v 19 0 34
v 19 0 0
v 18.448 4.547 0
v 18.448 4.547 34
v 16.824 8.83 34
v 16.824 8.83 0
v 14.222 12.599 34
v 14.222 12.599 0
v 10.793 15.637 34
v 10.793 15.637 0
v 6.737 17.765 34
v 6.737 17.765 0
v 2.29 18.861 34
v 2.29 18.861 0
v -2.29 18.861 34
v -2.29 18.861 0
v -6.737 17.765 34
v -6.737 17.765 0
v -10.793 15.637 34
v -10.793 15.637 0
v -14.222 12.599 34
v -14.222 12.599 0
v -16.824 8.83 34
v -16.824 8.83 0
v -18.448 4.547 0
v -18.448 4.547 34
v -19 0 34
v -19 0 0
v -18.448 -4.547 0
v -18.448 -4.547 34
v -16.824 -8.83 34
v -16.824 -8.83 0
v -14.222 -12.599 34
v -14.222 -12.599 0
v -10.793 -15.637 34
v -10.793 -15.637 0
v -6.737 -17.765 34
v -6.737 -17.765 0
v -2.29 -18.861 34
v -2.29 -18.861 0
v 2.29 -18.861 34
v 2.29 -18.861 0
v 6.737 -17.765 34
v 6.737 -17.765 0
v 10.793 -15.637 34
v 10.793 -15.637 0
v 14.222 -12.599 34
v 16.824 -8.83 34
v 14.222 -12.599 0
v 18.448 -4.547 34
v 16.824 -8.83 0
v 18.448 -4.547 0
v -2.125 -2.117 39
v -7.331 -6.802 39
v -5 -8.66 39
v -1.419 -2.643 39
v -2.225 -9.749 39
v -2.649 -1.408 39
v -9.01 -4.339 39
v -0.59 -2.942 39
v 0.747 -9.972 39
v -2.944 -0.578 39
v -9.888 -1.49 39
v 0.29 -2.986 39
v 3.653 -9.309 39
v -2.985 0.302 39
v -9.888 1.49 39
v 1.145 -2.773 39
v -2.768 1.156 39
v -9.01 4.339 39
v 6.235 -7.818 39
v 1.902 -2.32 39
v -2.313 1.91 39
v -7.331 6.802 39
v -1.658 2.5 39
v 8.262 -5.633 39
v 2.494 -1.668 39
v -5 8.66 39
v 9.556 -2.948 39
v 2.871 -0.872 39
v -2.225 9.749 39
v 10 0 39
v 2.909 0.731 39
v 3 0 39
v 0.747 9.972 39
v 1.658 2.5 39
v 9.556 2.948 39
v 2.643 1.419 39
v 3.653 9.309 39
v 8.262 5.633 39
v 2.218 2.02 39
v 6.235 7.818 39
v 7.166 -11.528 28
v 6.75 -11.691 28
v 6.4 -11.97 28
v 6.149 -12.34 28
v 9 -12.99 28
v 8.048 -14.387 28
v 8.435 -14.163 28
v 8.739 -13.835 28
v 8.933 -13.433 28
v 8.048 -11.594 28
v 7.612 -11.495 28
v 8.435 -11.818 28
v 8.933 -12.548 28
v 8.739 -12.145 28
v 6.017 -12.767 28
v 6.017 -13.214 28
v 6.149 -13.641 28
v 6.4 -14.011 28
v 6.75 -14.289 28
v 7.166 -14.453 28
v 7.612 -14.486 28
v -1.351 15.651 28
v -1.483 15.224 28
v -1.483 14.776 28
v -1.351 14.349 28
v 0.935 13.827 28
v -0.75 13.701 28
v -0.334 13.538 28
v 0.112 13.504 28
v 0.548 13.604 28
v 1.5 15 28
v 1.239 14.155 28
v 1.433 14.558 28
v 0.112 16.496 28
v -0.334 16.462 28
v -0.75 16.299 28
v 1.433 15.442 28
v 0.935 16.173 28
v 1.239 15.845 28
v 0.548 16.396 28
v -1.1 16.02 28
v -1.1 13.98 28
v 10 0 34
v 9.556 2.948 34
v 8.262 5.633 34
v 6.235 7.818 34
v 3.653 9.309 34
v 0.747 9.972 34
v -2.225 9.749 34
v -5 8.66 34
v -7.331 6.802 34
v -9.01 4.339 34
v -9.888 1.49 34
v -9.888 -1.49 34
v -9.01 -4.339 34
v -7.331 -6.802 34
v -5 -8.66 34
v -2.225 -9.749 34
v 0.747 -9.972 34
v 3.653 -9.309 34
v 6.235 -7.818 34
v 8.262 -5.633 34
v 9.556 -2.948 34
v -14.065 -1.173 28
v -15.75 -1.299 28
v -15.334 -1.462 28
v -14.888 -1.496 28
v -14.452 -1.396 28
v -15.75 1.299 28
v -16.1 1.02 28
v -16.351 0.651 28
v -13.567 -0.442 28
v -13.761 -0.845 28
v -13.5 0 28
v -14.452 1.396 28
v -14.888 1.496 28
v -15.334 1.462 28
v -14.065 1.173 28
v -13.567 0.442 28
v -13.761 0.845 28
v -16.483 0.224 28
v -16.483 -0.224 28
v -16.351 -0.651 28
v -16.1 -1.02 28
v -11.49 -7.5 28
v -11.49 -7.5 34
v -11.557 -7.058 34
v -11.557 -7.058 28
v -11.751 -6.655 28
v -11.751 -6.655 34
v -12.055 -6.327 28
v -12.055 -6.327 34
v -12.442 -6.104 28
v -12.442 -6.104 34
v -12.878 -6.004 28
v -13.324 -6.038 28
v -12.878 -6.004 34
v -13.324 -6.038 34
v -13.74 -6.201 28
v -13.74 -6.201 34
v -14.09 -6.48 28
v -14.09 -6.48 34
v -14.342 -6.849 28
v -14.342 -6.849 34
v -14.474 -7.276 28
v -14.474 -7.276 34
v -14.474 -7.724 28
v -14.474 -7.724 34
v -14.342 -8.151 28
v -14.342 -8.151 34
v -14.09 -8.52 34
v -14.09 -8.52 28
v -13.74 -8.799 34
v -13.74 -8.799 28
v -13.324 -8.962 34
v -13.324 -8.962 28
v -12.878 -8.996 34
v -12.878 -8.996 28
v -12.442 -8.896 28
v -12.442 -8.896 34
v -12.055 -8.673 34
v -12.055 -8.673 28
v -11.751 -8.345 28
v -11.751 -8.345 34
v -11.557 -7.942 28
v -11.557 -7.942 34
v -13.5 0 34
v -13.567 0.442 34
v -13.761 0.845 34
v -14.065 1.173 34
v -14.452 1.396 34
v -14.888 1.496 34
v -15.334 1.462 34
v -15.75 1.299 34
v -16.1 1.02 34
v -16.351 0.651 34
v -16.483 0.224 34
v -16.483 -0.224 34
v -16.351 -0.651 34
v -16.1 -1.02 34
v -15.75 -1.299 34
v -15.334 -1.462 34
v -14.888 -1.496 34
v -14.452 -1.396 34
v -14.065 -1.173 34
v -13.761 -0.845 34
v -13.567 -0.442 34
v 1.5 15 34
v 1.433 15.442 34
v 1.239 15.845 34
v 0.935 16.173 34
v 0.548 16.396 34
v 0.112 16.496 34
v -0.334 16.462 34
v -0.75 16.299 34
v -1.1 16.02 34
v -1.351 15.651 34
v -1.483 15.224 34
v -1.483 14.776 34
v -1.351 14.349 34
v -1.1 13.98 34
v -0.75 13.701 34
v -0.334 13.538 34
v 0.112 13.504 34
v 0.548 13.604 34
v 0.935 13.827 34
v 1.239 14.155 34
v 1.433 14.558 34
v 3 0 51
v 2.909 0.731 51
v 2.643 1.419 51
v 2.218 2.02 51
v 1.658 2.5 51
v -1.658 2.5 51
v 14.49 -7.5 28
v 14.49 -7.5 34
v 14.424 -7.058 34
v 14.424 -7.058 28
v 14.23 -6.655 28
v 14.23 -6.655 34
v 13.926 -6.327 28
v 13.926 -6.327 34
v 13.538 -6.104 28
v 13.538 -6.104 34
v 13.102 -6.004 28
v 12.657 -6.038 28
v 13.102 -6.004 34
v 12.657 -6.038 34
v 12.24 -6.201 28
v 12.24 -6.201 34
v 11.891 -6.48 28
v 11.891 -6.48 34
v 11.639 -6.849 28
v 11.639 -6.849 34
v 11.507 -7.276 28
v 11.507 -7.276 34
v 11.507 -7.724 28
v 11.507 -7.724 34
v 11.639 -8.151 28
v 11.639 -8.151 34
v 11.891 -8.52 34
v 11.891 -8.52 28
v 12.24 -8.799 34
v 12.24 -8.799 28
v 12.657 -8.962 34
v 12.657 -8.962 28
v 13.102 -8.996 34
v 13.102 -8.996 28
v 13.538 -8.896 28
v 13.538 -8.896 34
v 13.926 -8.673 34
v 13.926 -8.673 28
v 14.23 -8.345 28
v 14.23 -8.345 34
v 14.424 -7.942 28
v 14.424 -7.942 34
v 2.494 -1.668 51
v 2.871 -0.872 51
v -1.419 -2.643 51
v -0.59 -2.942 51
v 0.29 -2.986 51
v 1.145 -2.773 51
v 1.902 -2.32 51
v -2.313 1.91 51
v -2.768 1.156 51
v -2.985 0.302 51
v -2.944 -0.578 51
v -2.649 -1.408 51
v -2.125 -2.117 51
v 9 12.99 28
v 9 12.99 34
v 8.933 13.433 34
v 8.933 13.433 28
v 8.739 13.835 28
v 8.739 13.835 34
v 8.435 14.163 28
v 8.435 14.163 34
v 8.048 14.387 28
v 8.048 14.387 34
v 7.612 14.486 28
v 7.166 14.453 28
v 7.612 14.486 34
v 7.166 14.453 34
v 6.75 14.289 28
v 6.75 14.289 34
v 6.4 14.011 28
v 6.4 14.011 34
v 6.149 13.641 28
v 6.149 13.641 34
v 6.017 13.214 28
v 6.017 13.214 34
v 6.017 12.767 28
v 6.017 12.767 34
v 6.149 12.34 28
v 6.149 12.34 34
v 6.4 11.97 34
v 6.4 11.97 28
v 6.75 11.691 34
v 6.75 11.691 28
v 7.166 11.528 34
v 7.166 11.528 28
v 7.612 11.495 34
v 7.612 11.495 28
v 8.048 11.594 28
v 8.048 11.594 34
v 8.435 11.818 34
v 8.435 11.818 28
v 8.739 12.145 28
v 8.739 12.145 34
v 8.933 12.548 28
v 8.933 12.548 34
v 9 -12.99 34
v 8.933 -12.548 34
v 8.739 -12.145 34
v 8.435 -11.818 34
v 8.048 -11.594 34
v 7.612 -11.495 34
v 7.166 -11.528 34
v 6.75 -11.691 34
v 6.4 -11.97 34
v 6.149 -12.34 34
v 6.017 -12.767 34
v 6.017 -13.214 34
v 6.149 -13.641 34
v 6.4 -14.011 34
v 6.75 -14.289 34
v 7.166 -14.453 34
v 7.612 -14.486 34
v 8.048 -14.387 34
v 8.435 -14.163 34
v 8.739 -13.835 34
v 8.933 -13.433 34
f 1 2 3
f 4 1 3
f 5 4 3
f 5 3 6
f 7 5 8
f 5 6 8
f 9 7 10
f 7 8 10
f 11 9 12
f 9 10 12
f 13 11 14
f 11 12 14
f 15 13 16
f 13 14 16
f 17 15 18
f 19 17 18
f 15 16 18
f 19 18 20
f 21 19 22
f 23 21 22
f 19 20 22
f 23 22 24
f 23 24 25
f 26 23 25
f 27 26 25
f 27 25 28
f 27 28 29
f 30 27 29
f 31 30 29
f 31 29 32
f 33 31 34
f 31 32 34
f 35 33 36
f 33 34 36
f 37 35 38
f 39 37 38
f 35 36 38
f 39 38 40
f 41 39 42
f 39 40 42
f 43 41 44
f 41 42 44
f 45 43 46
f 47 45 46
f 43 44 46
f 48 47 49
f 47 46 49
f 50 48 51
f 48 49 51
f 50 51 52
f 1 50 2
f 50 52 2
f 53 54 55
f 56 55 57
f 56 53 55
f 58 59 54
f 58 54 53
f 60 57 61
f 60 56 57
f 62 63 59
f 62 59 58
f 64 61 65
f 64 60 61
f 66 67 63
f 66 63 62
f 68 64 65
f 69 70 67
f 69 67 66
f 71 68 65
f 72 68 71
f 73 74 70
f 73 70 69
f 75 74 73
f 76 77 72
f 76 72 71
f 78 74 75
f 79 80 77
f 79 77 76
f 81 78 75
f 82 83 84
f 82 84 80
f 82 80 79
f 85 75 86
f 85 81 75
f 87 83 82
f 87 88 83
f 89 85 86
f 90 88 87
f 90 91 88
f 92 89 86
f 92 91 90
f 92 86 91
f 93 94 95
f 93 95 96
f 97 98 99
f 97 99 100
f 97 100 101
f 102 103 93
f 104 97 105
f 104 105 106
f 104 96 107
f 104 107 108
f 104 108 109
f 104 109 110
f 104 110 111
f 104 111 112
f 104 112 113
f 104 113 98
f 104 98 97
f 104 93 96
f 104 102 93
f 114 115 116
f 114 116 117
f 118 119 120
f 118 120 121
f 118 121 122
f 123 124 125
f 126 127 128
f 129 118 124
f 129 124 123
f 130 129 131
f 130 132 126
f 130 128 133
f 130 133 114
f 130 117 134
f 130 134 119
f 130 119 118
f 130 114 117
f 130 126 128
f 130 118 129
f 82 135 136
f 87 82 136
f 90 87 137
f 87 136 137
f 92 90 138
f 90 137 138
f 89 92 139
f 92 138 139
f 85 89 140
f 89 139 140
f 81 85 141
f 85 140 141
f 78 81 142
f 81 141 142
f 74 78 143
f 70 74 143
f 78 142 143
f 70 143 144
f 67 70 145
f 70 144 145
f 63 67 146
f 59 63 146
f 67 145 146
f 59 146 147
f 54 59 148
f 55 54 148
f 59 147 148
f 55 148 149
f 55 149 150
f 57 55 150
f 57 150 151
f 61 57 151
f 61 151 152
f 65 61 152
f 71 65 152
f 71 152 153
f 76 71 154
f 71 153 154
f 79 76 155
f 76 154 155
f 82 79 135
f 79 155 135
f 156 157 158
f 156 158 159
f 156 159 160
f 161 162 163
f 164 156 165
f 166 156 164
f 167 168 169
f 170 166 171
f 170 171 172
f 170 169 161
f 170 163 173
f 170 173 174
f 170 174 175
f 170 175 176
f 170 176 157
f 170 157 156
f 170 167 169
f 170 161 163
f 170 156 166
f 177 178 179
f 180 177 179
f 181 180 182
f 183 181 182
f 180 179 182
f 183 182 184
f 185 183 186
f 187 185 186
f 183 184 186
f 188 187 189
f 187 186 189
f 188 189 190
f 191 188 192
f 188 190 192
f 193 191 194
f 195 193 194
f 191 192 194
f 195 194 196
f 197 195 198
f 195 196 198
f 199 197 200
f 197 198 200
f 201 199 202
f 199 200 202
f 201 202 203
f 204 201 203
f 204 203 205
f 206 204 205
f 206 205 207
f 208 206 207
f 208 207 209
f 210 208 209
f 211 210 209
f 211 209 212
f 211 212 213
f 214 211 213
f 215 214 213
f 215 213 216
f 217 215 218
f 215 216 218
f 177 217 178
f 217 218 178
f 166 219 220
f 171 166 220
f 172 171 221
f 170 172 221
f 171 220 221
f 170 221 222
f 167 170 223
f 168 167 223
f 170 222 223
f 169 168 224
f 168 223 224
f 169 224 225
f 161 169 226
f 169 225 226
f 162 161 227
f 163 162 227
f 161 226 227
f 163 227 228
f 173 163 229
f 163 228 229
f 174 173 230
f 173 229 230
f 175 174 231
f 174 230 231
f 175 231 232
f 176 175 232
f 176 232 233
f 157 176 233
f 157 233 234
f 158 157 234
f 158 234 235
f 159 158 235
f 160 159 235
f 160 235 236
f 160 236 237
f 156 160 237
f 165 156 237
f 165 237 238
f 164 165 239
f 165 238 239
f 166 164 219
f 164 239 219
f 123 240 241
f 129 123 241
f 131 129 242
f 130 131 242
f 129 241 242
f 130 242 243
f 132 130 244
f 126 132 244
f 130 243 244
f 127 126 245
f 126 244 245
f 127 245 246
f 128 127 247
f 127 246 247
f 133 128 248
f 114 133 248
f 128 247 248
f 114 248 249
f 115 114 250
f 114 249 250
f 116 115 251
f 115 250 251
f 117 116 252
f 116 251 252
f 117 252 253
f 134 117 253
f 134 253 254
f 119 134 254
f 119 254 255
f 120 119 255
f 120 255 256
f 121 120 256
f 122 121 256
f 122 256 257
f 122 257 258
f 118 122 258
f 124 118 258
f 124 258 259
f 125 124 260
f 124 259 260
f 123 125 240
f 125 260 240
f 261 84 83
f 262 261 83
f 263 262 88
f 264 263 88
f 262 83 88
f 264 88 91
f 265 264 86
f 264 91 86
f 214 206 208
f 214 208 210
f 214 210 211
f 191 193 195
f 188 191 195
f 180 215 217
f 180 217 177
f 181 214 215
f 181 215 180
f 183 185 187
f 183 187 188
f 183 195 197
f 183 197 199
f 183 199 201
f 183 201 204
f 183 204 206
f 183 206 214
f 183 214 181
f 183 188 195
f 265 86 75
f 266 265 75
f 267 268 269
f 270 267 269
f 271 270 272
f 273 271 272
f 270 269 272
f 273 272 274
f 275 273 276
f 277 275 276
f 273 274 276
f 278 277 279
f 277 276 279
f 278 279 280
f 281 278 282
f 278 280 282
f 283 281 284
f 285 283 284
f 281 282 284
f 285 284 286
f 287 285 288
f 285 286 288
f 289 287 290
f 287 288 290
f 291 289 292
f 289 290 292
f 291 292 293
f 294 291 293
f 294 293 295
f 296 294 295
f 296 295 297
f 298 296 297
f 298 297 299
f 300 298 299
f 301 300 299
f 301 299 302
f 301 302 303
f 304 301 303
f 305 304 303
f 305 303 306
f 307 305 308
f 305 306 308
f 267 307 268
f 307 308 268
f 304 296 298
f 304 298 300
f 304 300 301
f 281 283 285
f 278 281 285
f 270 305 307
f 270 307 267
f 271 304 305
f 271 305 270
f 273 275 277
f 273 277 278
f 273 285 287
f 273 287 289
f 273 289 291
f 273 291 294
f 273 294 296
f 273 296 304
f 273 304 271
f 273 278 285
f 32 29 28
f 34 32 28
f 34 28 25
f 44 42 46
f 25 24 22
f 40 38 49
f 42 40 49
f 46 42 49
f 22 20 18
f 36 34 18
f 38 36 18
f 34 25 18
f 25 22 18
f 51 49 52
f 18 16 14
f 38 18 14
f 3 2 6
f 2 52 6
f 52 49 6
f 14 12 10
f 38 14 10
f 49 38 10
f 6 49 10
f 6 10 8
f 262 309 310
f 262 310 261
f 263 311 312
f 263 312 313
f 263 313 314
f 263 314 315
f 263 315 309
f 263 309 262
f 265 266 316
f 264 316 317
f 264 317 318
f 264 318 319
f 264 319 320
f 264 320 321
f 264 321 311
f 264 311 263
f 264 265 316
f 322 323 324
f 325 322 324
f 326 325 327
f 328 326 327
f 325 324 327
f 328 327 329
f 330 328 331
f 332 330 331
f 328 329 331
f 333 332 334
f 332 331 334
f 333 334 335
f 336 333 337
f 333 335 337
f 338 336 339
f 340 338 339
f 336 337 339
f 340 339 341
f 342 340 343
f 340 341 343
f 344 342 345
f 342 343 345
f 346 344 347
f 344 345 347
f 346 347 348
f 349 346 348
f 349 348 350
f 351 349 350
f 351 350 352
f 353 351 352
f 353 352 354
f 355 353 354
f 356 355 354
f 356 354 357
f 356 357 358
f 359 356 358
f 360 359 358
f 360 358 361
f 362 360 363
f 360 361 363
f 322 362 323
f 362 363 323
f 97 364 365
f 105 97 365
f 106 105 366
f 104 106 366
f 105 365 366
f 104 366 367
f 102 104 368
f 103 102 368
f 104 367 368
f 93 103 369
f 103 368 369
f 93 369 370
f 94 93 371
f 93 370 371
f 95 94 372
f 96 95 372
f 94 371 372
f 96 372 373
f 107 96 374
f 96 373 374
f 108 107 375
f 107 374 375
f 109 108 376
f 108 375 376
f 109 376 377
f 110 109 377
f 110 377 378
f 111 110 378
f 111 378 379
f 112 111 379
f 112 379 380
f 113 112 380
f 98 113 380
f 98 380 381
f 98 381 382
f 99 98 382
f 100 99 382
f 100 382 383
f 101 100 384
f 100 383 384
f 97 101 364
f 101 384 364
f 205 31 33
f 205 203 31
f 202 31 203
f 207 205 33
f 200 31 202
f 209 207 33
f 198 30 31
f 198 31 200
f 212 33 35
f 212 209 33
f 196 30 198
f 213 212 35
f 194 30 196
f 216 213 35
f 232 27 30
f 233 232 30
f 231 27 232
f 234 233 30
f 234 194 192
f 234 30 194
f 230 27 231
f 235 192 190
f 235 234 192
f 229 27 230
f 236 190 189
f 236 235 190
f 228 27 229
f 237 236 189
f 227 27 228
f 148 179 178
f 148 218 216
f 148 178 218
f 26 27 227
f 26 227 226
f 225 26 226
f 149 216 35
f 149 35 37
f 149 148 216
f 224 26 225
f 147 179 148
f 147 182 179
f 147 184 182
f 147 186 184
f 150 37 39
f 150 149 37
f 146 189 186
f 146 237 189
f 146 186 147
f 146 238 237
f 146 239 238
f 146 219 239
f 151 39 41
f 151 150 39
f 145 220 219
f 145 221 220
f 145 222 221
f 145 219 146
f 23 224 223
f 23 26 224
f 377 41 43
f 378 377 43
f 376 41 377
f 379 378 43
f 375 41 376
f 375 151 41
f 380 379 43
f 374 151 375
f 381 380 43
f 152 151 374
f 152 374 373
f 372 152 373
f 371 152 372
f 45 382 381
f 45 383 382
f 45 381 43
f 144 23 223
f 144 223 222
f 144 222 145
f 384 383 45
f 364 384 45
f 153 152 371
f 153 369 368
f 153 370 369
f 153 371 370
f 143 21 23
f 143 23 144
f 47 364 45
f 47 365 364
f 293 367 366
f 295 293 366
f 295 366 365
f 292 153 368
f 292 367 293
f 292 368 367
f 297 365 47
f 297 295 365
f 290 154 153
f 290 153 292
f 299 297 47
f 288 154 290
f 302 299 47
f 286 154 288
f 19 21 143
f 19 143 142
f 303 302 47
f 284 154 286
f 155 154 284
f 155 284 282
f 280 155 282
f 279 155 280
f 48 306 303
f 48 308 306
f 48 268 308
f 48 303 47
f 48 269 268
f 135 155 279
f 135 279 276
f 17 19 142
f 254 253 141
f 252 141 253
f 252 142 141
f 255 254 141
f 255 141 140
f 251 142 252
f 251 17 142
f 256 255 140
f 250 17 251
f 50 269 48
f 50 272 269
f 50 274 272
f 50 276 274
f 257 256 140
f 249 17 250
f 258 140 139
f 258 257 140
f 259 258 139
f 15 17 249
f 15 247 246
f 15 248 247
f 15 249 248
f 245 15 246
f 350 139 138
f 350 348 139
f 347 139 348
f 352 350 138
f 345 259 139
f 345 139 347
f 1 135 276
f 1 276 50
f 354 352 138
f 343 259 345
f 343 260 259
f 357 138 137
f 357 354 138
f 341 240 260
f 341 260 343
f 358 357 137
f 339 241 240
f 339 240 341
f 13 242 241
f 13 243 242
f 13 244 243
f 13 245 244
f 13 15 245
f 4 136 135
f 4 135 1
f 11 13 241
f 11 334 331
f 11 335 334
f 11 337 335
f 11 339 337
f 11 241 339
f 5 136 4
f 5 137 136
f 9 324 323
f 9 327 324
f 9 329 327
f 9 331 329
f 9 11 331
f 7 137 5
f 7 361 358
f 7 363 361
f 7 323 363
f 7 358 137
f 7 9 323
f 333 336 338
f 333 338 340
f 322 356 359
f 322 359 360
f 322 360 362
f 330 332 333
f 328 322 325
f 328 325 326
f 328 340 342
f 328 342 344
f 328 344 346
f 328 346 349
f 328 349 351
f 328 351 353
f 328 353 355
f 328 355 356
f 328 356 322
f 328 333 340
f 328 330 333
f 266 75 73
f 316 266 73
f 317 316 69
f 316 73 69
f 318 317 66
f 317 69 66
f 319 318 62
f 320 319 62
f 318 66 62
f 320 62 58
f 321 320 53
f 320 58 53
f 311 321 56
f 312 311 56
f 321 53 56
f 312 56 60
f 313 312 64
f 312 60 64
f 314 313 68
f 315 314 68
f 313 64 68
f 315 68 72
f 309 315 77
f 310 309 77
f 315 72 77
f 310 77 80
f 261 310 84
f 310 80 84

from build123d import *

# Parameters (mm, degrees)
SKETCH1_R           = 19
BOSS_EXTRUDE1_DEPTH = 34
SKETCH2_R           = 1.5
CUT_EXTRUDE1_DEPTH  = 6
SKETCH3_R           = 10
BOSS_EXTRUDE2_DEPTH = 5
BOSS_EXTRUDE3_DEPTH = 12


with BuildPart() as part:
    # Sketch1 → Boss-Extrude1 (new body)
    with BuildSketch(Plane.XY):
        Circle(SKETCH1_R)
    extrude(amount=BOSS_EXTRUDE1_DEPTH)

    # Sketch2 → Cut-Extrude1 (cut)
    with BuildSketch(Plane.XY.offset(34)):
        with Locations((-12.990381057, -7.5)):
            Circle(SKETCH2_R)
        with Locations((-15, 0)):
            Circle(SKETCH2_R)
        with Locations((0, 15)):
            Circle(SKETCH2_R)
        with Locations((7.5, 12.990381057)):
            Circle(SKETCH2_R)
        with Locations((12.990381057, -7.5)):
            Circle(SKETCH2_R)
        with Locations((7.5, -12.990381057)):
            Circle(SKETCH2_R)
    extrude(amount=-CUT_EXTRUDE1_DEPTH, mode=Mode.SUBTRACT)

    # Sketch3 → Boss-Extrude2 (add)
    with BuildSketch(Plane.XY.offset(34)):
        Circle(SKETCH3_R)
    extrude(amount=BOSS_EXTRUDE2_DEPTH)

    # Sketch4 → Boss-Extrude3 (add)
    with BuildSketch(Plane.XY.offset(39)):
        with BuildLine():
            ThreePointArc((3, 0), (2.643382037, 1.418637165), (1.658312395, 2.5))
            Line((1.658312395, 2.5), (-1.658312395, 2.5))
            ThreePointArc((-1.658312395, 2.5), (-1.418637165, -2.643382037), (3, 0))
        make_face()
    extrude(amount=BOSS_EXTRUDE3_DEPTH)


solid = part.part
